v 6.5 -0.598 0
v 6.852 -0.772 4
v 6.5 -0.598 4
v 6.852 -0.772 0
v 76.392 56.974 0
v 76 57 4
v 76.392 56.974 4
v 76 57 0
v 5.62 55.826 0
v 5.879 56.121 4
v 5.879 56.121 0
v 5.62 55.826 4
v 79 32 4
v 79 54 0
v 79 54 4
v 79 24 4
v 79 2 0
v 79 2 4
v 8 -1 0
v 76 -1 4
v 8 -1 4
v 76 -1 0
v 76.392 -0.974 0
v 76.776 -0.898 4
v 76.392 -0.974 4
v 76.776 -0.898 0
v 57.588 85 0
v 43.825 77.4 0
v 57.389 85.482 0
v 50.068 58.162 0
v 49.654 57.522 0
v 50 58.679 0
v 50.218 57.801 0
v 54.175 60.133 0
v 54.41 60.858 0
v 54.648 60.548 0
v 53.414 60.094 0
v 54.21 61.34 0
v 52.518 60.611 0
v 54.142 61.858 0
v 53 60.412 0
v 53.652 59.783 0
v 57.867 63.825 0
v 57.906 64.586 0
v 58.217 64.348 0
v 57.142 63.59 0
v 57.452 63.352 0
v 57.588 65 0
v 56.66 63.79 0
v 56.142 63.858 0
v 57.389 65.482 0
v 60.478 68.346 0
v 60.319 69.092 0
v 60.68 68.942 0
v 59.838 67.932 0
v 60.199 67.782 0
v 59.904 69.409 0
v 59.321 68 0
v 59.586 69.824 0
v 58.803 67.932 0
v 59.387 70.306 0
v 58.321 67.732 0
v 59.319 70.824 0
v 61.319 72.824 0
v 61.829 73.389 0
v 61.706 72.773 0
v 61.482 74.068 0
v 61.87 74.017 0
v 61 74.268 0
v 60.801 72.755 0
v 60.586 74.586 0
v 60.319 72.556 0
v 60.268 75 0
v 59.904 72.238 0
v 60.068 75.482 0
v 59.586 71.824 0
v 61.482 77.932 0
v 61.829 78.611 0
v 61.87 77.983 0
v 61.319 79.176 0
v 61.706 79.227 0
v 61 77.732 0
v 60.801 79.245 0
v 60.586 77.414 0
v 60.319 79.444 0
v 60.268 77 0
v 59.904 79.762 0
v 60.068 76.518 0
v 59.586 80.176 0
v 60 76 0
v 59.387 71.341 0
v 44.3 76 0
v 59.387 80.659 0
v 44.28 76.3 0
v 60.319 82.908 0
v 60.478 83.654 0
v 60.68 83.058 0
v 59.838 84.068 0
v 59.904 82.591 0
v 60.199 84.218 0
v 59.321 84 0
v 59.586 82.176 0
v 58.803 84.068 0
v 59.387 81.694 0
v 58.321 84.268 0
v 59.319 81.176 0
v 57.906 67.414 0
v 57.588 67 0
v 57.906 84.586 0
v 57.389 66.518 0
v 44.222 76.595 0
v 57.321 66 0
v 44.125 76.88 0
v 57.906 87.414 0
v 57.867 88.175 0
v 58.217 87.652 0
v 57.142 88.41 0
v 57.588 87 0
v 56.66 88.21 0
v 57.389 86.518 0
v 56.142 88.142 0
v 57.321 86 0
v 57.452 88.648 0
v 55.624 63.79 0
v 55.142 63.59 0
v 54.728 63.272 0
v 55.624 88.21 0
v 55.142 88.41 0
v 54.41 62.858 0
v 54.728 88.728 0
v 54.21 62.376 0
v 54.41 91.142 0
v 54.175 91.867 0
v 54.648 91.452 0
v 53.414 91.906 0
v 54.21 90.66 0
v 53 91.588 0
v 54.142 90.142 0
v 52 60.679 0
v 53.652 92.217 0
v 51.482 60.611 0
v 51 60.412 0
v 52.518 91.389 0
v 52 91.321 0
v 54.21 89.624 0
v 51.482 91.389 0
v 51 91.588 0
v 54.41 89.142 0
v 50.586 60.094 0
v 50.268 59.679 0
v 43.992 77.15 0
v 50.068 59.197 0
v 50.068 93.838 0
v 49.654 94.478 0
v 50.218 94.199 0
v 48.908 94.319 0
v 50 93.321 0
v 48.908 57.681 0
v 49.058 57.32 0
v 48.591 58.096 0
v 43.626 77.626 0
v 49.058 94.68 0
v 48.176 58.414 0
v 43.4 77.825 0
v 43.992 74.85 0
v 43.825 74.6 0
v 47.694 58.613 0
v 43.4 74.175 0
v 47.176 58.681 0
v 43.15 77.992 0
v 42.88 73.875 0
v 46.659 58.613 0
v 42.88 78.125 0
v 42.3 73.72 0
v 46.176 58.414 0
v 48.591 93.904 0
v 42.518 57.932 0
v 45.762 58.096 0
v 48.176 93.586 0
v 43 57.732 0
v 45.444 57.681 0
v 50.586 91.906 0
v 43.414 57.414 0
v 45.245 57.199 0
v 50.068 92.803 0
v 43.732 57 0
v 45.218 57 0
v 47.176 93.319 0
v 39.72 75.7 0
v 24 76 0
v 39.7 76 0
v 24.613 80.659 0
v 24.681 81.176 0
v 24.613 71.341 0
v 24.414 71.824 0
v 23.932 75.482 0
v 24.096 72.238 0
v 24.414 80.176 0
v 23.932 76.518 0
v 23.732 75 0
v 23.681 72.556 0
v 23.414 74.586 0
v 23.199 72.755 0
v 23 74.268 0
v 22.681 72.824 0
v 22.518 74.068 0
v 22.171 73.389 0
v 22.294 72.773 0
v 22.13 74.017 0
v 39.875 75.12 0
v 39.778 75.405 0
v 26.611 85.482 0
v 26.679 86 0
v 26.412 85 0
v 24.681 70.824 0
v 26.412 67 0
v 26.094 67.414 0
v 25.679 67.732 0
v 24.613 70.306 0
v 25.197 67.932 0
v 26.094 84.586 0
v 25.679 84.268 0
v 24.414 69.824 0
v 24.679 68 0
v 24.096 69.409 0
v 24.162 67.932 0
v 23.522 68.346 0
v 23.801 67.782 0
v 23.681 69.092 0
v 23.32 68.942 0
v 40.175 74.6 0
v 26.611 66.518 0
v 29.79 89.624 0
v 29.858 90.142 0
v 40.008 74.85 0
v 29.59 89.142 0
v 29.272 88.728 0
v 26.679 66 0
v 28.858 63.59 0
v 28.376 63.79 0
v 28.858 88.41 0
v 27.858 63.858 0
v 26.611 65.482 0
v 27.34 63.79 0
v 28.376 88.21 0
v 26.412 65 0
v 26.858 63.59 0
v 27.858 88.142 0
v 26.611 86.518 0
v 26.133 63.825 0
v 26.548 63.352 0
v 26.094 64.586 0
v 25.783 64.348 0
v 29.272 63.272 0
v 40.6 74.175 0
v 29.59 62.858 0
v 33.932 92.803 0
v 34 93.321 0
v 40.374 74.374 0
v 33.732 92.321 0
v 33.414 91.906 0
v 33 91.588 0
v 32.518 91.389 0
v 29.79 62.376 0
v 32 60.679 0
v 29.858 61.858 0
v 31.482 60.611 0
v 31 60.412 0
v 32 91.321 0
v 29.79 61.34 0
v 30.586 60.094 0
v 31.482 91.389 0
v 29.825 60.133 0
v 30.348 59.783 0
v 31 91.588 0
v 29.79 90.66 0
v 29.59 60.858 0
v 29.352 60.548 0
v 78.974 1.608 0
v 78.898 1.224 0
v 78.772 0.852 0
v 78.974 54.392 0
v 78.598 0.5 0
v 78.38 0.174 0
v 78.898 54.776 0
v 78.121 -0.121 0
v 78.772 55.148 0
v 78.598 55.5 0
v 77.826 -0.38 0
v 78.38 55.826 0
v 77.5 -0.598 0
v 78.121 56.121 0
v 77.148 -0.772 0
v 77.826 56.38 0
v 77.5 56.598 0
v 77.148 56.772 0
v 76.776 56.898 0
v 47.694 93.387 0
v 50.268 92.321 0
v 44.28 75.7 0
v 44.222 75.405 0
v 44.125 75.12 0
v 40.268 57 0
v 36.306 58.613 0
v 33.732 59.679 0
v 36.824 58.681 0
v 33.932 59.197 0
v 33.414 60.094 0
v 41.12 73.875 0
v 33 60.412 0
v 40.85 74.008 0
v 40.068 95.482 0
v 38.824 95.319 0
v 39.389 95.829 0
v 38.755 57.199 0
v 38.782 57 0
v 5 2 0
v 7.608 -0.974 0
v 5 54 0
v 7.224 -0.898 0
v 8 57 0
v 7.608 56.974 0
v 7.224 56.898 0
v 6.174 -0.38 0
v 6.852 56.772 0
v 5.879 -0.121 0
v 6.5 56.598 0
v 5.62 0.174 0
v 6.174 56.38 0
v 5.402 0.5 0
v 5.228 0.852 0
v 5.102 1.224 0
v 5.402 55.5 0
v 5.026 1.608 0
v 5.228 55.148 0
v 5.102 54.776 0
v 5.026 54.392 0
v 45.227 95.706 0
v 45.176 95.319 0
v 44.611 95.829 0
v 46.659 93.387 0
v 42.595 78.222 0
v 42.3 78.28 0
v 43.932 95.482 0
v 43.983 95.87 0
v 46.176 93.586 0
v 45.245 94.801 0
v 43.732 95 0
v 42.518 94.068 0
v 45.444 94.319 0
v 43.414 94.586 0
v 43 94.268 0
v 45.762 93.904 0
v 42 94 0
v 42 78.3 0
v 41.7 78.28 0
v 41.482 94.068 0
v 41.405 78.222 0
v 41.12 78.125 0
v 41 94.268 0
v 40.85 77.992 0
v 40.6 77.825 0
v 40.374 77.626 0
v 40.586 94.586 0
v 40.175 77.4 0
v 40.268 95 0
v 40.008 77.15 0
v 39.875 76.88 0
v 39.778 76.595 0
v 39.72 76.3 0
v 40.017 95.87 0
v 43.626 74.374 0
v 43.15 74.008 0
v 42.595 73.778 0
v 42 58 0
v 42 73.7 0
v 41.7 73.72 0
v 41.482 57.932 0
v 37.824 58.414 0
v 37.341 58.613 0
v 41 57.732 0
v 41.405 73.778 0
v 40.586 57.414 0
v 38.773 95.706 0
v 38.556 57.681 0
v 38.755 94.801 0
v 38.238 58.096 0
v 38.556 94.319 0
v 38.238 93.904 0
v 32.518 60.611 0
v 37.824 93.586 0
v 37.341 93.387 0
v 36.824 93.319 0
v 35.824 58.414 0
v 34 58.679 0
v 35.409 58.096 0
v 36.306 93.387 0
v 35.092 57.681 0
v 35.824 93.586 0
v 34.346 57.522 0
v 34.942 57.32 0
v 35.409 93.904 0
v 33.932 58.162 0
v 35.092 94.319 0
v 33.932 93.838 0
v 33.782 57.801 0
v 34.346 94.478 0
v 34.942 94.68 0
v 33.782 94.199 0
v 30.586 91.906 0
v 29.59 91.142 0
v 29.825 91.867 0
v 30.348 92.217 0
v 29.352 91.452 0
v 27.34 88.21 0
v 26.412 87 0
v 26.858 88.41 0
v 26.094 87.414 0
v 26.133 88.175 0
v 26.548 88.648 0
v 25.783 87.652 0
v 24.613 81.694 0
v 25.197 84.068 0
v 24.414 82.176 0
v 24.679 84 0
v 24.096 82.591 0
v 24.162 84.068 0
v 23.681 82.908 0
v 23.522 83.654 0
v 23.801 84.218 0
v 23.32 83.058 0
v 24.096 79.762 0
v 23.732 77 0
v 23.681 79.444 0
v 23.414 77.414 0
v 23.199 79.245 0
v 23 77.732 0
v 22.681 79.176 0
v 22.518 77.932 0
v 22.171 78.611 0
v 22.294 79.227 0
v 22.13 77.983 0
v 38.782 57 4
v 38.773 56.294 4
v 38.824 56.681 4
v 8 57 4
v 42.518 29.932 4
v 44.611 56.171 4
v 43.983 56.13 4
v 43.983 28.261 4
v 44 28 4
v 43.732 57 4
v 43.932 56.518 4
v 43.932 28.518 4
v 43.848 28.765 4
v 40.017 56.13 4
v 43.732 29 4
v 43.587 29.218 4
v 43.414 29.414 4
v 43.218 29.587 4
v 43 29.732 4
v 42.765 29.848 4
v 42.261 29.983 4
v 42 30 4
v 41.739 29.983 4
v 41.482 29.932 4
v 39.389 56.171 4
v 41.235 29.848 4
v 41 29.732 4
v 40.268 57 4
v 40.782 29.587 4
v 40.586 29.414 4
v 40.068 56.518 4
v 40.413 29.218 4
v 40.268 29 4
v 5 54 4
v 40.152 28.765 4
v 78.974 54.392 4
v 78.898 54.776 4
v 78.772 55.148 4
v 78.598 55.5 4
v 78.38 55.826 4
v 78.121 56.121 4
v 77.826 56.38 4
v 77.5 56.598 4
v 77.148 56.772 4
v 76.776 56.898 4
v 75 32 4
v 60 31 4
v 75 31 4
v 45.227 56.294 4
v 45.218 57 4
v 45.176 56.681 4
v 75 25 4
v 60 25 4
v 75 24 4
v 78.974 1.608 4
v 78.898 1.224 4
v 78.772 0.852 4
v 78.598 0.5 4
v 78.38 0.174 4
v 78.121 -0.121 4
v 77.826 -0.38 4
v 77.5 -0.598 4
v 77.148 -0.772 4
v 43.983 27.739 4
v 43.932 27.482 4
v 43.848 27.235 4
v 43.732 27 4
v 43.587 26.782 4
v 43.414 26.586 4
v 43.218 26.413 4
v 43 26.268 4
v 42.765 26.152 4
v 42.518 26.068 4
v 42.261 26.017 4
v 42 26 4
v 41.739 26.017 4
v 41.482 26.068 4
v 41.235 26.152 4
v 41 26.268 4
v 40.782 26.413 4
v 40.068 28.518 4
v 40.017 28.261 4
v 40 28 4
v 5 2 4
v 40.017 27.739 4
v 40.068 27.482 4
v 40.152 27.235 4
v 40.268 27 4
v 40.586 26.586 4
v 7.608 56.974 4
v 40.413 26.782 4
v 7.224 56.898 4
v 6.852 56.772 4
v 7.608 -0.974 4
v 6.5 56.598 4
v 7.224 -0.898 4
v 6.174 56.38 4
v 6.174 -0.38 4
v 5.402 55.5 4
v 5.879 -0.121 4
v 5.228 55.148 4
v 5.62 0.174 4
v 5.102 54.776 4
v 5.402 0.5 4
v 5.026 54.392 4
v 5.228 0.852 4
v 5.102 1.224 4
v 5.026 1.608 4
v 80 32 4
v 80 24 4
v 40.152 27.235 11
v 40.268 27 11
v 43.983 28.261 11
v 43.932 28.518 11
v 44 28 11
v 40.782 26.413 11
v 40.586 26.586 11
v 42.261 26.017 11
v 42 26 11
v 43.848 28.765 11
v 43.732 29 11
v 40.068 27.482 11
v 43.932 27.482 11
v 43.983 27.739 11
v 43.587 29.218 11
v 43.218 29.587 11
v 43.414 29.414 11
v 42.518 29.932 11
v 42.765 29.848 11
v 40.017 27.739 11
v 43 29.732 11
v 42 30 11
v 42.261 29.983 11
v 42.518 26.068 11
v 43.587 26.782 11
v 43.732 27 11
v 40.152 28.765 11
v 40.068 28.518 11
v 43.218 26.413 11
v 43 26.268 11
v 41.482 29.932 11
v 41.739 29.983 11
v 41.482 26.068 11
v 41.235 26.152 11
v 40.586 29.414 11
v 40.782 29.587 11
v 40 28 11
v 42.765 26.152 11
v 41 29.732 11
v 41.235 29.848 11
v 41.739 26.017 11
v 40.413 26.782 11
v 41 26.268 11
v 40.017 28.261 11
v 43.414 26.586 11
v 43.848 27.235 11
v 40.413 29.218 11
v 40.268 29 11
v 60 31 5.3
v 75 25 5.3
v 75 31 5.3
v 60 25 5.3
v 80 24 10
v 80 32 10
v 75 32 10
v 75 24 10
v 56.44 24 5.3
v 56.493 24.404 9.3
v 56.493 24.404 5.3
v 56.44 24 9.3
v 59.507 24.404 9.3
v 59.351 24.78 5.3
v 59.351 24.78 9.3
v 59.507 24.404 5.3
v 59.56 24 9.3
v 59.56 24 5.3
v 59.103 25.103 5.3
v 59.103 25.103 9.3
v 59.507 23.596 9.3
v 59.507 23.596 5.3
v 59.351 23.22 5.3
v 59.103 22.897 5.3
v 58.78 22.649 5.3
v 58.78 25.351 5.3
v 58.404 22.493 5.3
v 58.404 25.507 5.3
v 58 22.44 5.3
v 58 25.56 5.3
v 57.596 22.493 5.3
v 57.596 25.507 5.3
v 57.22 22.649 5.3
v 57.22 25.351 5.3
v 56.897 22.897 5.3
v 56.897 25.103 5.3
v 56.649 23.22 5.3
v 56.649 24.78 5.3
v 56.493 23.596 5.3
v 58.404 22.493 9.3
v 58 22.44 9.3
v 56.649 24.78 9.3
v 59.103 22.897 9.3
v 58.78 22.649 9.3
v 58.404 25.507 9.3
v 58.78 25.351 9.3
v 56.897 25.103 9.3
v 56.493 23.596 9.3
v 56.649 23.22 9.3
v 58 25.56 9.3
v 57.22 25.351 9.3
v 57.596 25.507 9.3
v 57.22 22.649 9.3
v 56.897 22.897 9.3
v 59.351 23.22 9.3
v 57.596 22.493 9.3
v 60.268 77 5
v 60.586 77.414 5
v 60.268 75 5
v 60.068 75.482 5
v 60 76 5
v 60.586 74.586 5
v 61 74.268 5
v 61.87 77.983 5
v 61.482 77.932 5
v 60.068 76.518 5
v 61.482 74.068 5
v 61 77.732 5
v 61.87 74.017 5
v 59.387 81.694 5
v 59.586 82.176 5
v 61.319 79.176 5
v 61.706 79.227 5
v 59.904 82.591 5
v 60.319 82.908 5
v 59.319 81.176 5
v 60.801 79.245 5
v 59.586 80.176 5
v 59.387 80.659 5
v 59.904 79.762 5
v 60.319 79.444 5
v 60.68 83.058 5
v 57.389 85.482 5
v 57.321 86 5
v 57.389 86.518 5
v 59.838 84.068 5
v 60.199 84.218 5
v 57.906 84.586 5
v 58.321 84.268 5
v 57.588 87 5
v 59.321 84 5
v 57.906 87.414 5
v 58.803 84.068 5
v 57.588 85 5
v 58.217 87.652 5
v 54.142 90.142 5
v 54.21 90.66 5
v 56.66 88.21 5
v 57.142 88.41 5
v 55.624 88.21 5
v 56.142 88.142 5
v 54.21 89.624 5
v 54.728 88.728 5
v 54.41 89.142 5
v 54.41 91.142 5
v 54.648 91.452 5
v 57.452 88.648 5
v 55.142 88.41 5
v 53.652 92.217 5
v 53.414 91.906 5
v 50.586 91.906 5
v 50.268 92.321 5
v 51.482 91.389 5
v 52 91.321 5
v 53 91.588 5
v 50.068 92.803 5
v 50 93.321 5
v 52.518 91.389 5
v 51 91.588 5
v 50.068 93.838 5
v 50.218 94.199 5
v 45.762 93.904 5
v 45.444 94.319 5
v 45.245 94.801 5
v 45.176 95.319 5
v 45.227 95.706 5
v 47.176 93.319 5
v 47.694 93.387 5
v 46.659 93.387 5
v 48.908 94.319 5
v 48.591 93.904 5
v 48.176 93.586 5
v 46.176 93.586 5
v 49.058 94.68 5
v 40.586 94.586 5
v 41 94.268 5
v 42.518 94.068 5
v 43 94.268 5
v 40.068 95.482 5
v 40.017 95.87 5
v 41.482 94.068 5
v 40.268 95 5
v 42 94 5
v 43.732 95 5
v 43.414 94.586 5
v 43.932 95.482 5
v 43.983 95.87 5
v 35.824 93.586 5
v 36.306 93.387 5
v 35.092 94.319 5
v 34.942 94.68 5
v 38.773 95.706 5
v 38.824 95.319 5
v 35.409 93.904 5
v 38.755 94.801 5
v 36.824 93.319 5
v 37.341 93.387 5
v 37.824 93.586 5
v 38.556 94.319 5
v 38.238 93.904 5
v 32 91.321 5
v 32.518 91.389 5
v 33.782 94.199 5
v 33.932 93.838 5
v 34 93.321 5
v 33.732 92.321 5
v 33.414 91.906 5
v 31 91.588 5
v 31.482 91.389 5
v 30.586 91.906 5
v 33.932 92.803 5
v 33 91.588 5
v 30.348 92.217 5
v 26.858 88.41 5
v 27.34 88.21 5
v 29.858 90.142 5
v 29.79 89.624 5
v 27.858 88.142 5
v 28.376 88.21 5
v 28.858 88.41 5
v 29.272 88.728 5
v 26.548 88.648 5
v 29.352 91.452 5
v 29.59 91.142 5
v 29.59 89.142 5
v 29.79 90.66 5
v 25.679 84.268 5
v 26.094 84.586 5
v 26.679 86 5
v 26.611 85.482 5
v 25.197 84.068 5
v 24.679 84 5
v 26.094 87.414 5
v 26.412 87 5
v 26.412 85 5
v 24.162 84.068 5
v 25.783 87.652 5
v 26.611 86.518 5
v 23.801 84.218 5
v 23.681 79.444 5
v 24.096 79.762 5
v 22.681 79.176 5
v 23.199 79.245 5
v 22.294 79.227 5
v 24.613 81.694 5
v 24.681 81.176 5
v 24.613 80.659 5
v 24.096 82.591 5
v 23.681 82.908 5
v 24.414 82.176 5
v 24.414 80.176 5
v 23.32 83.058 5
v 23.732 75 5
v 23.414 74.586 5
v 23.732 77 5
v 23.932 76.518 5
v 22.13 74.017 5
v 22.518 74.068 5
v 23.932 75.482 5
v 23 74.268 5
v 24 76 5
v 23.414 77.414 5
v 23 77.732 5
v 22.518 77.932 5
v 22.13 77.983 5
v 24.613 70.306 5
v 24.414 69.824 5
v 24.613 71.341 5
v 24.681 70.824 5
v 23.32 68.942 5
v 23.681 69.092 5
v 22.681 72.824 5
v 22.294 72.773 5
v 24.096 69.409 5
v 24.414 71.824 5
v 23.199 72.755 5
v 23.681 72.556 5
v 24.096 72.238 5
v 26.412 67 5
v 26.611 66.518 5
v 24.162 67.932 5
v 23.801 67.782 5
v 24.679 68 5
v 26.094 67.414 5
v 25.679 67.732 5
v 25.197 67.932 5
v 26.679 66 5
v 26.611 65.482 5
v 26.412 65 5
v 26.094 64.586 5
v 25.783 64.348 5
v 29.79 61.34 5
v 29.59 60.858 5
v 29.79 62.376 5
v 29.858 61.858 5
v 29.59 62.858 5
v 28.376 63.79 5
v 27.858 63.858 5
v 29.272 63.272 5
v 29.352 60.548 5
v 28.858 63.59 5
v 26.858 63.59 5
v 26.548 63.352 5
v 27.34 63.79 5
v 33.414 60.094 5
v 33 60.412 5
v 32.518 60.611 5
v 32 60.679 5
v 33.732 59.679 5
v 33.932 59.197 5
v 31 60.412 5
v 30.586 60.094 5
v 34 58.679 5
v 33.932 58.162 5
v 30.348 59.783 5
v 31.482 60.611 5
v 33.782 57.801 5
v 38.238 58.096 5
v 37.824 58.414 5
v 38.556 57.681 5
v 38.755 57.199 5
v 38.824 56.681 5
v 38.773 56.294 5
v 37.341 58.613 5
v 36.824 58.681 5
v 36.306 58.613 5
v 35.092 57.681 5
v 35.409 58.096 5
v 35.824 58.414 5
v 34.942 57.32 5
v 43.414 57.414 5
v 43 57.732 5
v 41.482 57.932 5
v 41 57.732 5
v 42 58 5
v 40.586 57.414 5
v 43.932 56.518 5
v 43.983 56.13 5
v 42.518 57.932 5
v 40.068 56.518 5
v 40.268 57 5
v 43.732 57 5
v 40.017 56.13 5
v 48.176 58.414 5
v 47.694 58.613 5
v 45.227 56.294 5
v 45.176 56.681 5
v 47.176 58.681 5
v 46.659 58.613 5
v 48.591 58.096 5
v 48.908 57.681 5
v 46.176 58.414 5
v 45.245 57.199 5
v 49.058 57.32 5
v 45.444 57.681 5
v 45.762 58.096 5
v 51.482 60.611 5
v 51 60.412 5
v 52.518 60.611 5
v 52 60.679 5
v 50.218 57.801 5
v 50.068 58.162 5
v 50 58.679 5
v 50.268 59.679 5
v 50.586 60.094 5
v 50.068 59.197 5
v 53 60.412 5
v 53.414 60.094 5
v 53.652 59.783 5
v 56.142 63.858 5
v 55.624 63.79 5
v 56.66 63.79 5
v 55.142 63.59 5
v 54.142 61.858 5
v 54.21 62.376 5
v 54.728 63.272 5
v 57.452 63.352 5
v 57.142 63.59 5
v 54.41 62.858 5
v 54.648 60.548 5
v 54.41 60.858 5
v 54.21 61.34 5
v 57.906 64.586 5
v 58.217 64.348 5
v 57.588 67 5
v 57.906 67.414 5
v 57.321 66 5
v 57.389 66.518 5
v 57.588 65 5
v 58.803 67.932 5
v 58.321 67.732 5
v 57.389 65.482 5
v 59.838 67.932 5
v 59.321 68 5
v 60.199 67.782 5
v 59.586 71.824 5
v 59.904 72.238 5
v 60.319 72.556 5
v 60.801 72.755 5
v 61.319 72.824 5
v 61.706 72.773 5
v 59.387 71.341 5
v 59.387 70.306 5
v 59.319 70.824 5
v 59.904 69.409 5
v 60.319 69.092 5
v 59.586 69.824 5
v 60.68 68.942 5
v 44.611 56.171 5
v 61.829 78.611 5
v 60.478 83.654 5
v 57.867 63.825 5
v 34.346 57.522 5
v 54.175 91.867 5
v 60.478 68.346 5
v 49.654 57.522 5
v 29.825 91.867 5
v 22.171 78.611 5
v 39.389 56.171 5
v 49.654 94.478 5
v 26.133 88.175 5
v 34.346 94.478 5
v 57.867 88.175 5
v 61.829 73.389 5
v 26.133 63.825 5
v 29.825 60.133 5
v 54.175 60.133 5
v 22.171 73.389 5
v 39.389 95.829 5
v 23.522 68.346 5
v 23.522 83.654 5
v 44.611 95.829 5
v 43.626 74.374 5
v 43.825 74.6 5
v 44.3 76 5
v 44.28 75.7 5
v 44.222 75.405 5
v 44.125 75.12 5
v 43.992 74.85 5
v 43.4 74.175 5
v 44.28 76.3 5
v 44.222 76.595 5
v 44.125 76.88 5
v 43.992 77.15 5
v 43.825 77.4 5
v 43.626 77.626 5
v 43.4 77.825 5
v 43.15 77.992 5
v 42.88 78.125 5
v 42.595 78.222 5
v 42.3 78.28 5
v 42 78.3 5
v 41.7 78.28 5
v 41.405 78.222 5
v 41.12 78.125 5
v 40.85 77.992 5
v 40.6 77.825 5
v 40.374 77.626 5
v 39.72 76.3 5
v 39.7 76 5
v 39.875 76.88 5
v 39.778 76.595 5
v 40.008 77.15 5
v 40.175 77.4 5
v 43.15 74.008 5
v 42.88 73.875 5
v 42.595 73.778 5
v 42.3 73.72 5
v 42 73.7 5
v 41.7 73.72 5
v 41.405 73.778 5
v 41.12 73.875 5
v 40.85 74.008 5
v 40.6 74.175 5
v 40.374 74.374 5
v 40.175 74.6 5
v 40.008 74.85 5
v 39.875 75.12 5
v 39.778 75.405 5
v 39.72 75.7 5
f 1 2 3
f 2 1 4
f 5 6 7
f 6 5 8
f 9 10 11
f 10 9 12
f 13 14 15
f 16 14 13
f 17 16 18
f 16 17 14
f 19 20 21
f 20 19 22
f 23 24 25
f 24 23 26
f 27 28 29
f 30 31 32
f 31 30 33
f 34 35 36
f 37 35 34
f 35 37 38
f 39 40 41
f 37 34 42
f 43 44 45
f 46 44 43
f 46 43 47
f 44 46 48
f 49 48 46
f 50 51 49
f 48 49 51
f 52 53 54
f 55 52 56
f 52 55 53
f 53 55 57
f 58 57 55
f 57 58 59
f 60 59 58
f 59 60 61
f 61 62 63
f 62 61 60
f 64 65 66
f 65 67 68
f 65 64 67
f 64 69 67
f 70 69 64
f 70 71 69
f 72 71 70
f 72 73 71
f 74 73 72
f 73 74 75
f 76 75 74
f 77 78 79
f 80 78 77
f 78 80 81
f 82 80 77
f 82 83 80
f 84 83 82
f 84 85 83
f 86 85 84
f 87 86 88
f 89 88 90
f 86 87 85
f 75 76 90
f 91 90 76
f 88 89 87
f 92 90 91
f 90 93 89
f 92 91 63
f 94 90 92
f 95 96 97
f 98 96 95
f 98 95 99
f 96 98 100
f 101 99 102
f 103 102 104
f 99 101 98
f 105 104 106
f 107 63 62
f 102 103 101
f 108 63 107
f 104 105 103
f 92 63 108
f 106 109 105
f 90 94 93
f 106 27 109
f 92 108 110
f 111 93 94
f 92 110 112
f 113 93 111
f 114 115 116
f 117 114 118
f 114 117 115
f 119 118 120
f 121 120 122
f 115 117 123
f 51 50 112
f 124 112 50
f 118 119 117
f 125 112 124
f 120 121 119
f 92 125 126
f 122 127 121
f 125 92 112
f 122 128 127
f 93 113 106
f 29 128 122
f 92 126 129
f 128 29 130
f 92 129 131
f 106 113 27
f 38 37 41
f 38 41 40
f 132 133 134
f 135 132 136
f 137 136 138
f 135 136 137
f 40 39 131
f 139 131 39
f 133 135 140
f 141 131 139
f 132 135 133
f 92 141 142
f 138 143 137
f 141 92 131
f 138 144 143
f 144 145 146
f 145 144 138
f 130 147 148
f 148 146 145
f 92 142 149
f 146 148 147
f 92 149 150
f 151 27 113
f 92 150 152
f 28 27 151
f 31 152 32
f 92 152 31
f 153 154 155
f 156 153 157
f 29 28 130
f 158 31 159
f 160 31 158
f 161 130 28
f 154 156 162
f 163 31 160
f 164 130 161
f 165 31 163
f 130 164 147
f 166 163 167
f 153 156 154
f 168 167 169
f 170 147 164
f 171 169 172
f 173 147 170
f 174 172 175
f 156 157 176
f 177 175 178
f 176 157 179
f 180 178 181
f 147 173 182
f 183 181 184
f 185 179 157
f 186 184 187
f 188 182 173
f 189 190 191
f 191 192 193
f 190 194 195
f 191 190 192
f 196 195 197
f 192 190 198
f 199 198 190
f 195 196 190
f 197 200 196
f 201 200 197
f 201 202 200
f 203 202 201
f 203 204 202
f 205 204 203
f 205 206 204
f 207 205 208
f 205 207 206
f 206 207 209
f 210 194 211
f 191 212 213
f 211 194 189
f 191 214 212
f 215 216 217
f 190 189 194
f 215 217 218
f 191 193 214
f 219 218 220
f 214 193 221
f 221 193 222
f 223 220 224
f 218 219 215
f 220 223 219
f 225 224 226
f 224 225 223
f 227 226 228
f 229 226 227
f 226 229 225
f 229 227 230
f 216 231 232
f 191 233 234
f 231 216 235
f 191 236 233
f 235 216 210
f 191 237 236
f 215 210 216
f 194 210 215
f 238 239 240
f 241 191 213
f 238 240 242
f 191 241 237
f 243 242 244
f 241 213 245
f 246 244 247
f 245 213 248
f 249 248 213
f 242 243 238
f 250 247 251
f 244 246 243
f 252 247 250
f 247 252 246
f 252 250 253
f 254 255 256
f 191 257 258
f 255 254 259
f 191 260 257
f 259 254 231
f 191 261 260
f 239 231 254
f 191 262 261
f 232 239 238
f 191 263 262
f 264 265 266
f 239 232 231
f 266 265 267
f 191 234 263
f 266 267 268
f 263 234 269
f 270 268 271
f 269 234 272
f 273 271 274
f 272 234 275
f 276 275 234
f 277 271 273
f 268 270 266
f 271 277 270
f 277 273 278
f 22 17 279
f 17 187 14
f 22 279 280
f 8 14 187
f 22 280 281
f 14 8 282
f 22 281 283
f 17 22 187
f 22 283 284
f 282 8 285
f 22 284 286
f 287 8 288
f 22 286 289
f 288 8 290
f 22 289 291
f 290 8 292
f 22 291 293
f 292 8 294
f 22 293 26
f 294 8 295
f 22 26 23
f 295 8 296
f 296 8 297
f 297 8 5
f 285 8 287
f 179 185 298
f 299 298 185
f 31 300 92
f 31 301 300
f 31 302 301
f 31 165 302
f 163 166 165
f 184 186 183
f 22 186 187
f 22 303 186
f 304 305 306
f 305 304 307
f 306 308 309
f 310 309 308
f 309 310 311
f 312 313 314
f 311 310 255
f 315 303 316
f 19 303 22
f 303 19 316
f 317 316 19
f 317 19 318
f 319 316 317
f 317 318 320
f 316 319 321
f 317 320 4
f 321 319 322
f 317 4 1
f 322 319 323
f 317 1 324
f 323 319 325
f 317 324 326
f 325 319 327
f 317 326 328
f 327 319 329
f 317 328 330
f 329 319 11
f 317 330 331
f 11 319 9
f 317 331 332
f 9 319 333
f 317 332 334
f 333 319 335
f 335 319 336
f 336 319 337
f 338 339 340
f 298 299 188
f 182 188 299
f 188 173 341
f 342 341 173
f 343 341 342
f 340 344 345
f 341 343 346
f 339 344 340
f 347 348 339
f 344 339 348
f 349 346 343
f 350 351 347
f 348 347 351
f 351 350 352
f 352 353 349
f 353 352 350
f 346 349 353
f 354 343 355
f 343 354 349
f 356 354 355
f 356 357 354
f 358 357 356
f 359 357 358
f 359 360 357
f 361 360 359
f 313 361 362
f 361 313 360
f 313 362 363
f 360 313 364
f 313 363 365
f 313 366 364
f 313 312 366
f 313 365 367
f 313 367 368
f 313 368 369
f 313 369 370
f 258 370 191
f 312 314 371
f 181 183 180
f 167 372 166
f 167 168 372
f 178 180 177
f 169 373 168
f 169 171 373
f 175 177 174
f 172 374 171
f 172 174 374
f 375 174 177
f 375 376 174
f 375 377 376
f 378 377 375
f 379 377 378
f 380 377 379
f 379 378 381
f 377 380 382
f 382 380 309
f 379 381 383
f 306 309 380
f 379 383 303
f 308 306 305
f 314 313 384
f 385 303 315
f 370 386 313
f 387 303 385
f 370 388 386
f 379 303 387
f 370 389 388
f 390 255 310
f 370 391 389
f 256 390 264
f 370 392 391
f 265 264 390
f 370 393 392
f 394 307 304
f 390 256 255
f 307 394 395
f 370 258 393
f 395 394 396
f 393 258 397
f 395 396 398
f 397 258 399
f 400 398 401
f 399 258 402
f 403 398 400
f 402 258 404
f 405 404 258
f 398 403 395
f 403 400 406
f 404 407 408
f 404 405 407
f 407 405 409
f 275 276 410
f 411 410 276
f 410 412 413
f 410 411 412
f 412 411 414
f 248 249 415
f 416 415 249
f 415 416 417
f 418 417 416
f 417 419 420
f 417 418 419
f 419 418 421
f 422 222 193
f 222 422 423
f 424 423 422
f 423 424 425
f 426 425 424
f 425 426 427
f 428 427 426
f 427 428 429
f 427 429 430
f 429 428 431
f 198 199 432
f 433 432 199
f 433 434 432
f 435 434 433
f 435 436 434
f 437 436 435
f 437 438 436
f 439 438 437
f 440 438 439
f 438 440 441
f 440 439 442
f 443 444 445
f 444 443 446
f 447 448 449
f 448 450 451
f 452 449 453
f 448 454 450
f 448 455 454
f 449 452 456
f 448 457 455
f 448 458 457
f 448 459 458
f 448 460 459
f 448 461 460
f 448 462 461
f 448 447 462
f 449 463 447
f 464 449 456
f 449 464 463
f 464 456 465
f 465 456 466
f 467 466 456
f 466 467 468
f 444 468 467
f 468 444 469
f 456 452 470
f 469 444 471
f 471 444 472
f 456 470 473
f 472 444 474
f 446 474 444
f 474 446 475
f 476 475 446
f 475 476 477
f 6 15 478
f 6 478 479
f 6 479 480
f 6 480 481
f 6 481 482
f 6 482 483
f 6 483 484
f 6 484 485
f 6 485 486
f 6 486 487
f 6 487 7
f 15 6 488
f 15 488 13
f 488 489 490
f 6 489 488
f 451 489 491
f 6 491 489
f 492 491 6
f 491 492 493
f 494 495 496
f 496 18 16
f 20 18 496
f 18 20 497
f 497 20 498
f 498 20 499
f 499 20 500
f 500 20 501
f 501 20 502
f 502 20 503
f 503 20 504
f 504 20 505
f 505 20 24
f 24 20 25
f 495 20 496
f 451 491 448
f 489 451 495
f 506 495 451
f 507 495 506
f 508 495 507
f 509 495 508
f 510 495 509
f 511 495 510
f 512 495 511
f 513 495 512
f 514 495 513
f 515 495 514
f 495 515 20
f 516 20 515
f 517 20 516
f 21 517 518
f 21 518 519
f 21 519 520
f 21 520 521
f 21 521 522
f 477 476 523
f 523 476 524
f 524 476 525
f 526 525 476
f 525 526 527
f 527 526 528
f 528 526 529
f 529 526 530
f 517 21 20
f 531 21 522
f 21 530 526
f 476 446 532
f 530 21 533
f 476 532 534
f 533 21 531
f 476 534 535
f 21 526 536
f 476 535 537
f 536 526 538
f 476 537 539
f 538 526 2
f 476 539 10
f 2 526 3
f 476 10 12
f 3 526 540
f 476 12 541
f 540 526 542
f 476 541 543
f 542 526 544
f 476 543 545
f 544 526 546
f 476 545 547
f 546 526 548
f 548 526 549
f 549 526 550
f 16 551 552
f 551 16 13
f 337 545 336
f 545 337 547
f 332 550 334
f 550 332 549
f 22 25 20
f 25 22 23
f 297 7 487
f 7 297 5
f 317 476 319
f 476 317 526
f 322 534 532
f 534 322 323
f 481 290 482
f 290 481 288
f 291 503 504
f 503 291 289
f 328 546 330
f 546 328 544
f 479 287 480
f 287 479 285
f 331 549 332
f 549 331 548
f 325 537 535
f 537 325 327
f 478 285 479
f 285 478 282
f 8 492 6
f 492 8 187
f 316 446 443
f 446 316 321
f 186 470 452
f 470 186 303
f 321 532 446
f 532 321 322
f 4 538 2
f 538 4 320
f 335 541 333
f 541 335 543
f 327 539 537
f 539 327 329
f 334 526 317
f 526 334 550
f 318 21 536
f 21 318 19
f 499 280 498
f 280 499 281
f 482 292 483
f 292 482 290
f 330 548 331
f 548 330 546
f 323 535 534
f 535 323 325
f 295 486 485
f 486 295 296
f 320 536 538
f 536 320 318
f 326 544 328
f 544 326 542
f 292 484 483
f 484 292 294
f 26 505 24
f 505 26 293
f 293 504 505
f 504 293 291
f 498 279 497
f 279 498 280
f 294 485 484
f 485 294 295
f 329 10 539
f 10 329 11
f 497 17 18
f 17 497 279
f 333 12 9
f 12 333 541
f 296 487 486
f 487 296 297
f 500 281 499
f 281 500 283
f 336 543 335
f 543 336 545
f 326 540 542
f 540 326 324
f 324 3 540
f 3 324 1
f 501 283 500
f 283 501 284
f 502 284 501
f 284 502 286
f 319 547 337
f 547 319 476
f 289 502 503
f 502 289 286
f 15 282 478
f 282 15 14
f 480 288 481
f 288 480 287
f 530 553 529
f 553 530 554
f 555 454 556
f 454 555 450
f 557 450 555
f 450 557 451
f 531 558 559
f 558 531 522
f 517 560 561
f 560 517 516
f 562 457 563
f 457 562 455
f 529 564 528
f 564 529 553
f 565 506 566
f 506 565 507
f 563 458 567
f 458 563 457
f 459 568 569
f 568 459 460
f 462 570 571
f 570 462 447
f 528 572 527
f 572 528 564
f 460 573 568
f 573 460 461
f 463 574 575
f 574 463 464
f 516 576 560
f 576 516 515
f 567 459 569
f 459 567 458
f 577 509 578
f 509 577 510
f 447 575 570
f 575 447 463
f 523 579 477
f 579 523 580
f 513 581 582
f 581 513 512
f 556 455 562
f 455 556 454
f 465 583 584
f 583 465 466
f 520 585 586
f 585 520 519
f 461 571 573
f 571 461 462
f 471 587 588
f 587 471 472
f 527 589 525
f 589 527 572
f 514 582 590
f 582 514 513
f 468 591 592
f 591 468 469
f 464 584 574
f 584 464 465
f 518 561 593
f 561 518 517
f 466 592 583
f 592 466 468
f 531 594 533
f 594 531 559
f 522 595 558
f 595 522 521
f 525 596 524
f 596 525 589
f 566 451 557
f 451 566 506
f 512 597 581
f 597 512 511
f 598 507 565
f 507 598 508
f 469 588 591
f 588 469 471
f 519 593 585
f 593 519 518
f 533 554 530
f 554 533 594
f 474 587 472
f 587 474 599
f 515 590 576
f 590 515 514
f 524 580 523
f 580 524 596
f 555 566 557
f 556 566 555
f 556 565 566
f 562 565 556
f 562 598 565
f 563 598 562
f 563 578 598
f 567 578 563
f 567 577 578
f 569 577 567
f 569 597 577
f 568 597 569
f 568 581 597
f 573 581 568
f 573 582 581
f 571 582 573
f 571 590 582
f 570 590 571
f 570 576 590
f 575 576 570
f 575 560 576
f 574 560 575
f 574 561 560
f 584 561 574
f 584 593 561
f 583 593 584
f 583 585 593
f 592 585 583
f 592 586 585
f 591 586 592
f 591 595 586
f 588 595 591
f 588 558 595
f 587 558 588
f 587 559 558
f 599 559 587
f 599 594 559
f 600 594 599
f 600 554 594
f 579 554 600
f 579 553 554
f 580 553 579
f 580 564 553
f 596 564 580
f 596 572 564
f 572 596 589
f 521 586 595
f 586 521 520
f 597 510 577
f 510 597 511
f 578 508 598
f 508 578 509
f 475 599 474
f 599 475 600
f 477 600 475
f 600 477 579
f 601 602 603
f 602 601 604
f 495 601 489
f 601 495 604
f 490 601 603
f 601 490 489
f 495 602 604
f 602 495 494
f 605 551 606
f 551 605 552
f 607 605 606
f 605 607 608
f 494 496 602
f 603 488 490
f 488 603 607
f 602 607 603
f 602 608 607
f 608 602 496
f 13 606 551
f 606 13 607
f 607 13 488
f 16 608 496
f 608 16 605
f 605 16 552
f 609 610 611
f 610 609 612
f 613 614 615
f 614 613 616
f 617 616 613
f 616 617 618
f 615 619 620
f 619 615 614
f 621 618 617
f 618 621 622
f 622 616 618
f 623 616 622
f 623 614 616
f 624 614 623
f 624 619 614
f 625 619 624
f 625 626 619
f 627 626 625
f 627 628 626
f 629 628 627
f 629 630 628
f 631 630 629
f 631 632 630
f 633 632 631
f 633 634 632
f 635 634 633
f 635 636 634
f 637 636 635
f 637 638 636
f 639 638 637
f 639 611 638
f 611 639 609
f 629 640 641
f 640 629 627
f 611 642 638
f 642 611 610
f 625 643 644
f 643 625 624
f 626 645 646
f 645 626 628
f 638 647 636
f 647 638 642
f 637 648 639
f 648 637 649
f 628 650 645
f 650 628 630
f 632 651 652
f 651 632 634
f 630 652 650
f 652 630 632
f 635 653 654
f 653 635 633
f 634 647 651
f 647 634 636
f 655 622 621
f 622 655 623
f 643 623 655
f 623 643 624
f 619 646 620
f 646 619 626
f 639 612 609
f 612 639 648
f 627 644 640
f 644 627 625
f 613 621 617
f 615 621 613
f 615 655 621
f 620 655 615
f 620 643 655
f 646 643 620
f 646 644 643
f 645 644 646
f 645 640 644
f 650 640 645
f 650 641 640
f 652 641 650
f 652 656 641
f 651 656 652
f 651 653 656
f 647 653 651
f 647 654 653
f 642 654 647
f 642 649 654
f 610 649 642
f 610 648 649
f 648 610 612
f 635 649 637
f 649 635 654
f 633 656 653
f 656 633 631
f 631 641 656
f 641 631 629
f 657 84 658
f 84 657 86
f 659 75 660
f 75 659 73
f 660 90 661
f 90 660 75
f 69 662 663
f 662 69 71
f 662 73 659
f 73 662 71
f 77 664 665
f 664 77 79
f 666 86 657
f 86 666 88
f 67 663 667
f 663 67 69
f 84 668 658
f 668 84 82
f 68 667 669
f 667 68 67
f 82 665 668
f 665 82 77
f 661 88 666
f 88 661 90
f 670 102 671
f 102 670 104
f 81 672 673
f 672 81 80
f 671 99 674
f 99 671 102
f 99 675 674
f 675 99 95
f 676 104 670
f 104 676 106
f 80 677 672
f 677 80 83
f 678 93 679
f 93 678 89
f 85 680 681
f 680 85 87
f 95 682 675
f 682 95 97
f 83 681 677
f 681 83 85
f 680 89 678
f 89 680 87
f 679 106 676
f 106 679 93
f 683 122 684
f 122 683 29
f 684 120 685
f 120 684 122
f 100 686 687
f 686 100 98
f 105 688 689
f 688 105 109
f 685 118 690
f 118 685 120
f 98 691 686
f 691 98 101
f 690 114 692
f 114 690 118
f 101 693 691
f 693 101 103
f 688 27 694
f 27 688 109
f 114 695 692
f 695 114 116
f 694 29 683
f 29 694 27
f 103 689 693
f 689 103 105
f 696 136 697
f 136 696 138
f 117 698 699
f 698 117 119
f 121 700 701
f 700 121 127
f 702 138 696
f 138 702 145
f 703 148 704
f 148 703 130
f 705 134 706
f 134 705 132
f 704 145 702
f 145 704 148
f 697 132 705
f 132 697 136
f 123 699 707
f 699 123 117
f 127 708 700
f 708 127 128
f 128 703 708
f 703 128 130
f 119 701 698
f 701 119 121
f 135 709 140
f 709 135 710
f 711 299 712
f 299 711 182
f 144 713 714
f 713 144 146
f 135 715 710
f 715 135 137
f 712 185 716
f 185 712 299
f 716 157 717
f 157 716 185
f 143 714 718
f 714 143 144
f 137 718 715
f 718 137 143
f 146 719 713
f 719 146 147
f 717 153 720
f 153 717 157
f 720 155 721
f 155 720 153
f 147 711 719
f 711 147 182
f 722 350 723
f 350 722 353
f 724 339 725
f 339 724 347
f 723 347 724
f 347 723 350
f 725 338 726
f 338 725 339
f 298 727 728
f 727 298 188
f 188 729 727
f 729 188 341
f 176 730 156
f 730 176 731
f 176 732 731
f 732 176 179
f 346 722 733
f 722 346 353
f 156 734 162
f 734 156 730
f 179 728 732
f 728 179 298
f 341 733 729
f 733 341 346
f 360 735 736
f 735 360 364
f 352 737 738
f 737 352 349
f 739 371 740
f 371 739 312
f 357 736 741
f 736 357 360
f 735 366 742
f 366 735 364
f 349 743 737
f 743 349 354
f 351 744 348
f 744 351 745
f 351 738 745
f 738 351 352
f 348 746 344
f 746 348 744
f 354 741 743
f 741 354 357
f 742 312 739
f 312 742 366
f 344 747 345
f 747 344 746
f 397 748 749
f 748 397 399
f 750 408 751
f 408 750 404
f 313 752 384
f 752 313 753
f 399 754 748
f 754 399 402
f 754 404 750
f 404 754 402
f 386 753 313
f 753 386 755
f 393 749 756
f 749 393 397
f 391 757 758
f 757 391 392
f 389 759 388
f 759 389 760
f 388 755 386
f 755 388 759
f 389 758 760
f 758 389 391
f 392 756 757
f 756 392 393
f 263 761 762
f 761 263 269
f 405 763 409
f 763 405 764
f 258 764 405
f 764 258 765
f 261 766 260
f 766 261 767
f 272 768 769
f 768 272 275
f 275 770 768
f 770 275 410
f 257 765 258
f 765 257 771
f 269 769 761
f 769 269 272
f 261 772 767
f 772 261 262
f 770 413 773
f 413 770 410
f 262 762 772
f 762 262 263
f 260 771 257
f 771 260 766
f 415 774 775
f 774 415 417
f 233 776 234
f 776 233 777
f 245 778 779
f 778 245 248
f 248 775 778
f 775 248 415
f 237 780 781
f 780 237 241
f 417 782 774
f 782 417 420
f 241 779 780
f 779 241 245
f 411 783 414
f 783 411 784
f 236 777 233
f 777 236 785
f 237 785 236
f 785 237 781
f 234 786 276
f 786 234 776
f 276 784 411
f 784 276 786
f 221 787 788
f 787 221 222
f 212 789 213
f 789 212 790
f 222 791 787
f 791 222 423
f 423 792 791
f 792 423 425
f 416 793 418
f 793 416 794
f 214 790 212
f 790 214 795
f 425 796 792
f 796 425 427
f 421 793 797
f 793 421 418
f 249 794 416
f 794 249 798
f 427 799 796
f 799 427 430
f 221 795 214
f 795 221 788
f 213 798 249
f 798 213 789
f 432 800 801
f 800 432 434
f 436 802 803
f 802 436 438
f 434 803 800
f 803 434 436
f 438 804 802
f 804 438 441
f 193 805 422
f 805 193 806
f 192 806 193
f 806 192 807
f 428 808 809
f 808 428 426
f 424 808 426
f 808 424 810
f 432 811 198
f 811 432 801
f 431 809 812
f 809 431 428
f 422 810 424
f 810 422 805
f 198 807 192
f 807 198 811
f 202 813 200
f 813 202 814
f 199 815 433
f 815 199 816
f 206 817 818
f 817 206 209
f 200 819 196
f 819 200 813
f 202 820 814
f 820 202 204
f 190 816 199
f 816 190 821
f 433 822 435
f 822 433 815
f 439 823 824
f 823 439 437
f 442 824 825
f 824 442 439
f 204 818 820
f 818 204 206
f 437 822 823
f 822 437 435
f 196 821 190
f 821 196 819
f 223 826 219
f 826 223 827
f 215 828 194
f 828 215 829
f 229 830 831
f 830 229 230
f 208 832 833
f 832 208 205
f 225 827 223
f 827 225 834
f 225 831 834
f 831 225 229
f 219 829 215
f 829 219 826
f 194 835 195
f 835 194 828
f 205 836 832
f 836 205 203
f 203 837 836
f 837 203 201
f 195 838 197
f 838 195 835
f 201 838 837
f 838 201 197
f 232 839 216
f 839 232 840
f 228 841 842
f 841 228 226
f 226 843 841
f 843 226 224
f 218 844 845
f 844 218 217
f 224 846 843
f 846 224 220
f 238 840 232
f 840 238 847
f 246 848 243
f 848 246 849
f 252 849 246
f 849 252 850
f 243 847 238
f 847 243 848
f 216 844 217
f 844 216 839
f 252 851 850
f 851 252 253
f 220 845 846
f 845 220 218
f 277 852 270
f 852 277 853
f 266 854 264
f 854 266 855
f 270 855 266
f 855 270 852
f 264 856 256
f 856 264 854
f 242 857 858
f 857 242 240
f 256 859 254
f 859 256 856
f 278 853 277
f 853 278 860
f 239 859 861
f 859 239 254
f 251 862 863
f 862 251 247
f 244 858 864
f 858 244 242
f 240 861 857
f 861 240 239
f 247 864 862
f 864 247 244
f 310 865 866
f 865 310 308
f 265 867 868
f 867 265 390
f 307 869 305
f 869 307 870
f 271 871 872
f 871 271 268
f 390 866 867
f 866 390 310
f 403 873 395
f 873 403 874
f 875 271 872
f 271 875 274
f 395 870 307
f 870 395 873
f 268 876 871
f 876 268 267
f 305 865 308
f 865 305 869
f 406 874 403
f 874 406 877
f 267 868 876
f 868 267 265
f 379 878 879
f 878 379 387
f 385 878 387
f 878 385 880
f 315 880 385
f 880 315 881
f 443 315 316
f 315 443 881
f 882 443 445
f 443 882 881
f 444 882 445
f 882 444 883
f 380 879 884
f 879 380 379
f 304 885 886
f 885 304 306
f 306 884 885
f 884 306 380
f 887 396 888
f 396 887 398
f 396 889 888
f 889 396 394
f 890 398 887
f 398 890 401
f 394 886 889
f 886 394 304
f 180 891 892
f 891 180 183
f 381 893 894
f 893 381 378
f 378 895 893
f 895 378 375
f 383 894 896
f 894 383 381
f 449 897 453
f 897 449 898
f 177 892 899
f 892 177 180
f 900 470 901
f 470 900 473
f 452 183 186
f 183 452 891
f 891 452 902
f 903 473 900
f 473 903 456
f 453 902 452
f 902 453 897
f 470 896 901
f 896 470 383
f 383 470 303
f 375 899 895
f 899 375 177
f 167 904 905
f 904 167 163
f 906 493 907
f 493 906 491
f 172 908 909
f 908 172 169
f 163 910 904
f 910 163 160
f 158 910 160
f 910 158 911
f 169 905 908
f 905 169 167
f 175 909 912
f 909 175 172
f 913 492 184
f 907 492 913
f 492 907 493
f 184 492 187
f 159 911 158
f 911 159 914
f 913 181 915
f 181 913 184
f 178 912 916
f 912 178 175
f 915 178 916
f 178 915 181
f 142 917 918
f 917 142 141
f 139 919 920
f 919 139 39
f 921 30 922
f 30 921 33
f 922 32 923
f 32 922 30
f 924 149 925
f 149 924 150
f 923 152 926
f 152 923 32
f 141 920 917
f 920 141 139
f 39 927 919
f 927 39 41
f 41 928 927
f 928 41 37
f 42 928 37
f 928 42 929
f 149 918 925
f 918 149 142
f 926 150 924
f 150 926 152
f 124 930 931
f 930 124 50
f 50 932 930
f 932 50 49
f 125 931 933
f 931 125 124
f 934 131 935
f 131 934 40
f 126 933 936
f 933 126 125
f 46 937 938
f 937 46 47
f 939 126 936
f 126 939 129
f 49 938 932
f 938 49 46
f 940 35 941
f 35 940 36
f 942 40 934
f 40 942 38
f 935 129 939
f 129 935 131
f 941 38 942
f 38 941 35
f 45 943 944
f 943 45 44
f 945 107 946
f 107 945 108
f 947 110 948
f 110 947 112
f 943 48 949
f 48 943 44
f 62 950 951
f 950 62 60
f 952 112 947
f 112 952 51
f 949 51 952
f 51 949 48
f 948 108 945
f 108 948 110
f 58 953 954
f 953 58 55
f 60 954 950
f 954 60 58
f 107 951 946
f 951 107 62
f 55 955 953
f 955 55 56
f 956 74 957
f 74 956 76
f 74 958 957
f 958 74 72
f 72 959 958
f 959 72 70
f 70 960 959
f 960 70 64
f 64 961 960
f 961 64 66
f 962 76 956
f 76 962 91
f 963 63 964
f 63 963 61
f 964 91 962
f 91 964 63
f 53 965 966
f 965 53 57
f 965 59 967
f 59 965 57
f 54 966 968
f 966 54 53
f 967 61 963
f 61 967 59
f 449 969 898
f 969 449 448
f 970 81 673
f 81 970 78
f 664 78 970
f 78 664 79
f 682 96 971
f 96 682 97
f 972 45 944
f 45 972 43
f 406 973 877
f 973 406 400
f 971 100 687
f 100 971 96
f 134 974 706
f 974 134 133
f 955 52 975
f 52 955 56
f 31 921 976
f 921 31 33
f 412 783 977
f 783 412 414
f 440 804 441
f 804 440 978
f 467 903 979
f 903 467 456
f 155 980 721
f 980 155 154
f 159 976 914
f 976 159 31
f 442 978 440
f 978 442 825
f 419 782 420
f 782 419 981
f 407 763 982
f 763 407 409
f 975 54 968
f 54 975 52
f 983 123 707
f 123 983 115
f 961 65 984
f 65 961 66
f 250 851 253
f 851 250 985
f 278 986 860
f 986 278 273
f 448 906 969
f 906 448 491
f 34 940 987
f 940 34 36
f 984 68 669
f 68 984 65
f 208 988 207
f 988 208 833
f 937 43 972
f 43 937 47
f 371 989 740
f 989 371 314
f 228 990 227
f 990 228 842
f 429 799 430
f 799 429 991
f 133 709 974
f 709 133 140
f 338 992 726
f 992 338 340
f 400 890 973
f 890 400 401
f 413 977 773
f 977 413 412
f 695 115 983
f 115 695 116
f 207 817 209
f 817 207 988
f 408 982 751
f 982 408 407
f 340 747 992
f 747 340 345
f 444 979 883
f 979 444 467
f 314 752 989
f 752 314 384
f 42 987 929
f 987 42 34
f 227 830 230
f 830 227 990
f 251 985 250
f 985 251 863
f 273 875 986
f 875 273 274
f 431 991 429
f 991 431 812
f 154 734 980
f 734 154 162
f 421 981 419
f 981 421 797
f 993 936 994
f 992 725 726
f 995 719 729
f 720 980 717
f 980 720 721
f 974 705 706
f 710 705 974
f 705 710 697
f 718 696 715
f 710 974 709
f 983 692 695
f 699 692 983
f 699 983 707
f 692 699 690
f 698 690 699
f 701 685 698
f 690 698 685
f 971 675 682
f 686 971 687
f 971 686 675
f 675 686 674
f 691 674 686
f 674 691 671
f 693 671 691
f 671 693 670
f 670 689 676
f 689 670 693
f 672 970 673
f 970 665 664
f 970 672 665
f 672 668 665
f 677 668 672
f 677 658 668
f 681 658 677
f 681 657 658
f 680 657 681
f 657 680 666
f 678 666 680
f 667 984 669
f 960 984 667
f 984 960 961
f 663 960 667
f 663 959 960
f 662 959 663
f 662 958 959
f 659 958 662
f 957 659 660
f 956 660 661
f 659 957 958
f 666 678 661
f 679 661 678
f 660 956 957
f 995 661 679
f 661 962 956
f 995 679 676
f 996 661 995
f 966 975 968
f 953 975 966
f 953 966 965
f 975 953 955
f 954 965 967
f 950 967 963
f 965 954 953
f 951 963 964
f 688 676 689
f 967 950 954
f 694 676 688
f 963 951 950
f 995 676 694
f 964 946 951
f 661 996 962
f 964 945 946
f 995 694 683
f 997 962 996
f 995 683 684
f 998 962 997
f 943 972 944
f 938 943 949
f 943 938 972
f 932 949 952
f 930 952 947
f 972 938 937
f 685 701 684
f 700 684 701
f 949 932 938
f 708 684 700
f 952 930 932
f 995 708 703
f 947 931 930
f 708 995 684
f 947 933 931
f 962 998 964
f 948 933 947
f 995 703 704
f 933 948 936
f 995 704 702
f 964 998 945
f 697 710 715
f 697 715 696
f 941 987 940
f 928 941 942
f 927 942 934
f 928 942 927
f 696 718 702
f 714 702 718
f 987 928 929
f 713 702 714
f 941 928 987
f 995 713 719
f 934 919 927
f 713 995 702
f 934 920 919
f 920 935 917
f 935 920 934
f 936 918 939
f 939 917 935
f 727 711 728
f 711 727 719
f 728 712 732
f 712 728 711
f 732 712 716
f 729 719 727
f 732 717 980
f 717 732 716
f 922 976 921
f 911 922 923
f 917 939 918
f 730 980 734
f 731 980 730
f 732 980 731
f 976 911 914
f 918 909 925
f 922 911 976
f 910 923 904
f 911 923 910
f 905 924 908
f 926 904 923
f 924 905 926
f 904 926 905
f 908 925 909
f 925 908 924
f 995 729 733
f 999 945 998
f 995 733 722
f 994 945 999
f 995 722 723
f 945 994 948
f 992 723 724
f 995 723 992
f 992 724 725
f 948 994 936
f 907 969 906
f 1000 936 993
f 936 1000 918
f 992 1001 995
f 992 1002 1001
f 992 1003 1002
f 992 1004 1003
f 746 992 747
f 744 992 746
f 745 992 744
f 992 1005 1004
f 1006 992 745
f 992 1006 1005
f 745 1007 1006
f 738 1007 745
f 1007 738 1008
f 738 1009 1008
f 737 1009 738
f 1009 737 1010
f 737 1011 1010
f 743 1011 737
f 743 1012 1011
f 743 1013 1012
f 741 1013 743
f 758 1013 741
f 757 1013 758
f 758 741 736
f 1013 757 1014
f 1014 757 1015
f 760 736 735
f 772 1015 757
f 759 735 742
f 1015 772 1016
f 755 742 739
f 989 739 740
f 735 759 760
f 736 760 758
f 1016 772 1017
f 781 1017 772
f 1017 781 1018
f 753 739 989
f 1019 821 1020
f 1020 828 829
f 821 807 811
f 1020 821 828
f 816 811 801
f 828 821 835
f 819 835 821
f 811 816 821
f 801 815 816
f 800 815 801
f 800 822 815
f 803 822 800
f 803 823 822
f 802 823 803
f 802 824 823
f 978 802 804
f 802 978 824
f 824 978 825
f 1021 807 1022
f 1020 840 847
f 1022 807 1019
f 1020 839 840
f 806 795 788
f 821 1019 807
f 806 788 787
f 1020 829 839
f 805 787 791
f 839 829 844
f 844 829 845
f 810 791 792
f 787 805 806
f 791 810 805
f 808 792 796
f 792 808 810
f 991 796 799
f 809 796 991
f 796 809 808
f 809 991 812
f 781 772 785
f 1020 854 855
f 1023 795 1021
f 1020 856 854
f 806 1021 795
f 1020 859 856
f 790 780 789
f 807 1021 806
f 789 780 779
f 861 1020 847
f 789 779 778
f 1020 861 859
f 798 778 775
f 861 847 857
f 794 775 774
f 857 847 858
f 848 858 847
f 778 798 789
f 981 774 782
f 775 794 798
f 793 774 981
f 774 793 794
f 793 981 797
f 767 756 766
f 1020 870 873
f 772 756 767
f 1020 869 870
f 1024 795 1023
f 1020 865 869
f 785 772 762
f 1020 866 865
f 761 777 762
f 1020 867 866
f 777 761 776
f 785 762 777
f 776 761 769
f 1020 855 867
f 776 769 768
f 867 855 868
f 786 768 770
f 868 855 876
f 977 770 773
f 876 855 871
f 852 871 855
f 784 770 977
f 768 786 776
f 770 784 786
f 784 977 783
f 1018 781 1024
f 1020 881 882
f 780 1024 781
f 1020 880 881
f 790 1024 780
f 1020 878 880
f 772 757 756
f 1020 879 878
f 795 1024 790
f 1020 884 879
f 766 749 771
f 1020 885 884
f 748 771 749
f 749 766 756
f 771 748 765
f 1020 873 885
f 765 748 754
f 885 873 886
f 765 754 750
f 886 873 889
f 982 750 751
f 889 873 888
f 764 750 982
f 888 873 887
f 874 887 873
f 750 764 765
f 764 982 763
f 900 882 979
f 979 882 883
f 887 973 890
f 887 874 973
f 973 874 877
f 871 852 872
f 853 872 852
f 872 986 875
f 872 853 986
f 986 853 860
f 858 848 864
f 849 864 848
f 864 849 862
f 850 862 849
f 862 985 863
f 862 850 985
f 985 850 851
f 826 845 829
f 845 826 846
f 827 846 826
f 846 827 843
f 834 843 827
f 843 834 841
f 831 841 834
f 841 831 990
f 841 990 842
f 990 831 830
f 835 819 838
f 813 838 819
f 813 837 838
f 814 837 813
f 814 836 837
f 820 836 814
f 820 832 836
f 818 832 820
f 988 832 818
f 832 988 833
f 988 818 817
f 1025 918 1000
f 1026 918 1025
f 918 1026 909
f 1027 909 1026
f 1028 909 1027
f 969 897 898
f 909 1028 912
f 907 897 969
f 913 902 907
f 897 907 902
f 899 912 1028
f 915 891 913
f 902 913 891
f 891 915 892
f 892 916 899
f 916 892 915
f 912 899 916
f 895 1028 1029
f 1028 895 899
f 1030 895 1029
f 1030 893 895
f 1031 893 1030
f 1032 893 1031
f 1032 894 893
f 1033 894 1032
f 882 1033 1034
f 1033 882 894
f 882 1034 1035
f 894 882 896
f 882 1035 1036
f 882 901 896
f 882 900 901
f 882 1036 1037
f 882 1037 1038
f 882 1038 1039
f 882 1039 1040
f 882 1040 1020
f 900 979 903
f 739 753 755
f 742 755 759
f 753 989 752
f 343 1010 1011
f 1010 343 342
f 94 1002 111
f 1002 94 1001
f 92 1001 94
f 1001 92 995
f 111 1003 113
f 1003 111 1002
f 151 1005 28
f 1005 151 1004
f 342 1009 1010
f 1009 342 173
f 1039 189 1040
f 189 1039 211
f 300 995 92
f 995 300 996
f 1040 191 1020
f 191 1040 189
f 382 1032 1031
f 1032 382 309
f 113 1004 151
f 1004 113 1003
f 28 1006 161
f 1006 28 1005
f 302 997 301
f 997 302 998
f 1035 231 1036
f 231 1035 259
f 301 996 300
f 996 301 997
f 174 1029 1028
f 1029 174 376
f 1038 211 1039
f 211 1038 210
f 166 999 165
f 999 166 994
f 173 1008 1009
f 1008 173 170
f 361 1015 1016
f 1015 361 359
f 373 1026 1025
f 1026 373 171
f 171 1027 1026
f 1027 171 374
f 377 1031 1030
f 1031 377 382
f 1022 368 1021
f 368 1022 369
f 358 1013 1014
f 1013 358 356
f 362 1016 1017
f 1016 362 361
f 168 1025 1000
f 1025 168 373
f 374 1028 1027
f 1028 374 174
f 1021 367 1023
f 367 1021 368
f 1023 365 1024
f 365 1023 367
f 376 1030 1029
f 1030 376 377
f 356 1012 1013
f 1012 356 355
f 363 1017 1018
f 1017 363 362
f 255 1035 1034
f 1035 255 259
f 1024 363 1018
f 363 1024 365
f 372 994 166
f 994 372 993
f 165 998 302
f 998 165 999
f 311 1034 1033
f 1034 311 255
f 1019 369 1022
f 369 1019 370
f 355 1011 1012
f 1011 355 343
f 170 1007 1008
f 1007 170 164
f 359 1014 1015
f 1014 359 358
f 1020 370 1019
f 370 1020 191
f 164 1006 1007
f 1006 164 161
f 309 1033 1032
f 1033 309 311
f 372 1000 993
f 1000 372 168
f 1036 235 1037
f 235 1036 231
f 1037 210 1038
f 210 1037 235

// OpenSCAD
/*
Sample 108: Dreh-Rastindexierung — 24 Positionen
Generated from the FDM Mechanical Sample Library.
Units: millimetres.

Override examples:
  openscad -o custom.stl -D 'view="plate"' -D 'render_fn=64' model.scad
  openscad -o preview.png -D 'view="assembly"' model.scad
*/
use <../../../library/fdm_mechanisms.scad>

render_fn = is_undef(render_fn) ? 48 : render_fn;
view = is_undef(view) ? "plate" : view;
$fn = render_fn;

sample_detent_indexer(
    view=view,
    notches=24,
    beam_t=1.3,
    clearance=0.3
);
